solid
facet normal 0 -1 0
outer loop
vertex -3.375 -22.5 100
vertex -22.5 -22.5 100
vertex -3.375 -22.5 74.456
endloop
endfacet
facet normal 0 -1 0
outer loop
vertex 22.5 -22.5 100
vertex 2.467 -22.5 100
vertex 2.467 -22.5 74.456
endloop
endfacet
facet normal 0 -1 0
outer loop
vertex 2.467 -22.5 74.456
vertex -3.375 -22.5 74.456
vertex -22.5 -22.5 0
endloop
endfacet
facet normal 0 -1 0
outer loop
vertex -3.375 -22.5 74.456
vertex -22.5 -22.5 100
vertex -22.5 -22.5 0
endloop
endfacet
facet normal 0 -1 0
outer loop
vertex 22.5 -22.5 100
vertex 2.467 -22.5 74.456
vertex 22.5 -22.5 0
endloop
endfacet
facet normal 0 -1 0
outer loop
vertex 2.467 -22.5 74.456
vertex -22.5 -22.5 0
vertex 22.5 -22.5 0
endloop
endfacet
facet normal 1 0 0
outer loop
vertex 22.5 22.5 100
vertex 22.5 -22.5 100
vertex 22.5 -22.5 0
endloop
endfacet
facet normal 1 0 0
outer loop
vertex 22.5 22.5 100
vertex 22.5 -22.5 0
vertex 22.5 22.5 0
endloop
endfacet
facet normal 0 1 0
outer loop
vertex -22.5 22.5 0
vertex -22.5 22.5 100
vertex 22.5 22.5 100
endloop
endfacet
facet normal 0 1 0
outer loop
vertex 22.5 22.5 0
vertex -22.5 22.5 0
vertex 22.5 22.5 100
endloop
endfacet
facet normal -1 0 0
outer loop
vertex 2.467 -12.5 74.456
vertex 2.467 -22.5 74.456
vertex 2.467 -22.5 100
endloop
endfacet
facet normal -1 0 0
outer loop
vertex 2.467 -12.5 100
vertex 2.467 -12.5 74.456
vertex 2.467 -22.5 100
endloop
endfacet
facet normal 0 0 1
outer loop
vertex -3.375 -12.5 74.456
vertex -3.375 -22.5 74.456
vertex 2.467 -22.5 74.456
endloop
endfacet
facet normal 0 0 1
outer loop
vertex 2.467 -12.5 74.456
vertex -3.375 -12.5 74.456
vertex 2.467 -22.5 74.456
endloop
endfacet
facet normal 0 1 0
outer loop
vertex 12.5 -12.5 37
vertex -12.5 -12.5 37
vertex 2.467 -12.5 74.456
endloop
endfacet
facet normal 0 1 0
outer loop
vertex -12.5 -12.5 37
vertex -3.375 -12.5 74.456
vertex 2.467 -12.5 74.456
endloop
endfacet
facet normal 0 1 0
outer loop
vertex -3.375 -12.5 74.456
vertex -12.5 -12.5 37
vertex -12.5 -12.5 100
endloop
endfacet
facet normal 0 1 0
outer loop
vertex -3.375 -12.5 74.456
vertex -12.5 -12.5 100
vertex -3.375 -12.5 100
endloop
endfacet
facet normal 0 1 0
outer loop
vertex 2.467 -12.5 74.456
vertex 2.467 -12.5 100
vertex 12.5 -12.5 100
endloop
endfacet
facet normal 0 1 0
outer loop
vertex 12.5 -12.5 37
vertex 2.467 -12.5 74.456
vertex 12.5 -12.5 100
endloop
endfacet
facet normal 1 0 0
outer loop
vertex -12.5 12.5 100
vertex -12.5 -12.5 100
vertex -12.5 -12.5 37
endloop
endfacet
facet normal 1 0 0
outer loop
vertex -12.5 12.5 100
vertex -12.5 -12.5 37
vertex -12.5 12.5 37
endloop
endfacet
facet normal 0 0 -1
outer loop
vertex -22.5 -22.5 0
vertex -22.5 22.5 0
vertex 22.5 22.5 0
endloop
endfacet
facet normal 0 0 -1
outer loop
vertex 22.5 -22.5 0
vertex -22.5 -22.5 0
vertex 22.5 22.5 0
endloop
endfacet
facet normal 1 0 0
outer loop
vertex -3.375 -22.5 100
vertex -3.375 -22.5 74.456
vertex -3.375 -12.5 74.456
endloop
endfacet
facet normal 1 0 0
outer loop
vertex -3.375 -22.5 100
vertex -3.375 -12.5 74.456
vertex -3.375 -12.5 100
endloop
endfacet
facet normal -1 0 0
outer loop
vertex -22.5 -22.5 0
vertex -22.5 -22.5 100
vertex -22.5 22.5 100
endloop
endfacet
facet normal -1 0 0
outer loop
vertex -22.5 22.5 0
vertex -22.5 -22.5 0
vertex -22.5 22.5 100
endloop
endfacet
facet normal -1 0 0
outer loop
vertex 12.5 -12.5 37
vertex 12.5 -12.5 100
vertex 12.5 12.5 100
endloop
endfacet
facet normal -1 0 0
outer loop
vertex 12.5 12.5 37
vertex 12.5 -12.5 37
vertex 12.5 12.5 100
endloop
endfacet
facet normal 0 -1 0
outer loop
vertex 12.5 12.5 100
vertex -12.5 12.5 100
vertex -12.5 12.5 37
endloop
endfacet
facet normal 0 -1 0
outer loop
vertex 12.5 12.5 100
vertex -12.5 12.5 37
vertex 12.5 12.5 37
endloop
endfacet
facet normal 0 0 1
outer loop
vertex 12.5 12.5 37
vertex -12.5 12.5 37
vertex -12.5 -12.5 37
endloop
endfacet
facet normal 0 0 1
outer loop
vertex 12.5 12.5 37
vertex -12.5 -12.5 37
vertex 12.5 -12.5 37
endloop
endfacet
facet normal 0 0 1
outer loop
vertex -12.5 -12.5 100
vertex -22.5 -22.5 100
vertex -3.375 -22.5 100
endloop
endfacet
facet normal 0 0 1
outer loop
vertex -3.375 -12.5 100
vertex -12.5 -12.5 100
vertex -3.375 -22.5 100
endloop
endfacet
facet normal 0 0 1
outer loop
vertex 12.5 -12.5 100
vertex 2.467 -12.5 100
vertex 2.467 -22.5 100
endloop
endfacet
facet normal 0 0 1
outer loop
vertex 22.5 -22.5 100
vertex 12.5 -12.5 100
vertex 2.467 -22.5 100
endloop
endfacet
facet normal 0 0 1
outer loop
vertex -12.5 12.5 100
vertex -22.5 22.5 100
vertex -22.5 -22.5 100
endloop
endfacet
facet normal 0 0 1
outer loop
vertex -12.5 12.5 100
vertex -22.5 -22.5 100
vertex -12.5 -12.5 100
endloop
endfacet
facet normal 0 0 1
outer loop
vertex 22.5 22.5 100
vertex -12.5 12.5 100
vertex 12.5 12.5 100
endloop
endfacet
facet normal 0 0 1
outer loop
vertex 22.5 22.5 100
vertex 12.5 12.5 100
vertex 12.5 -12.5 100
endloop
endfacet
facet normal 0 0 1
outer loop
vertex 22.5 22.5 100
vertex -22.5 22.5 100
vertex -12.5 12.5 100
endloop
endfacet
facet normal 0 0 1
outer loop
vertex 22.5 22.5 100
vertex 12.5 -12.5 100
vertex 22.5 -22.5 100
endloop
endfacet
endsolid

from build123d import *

# Parameters (mm, degrees)
F0_W     = 45
F0_H     = 45
F1_DEPTH = 100
F2_W     = 25
F2_H     = 25
F3_DEPTH = 63
F4_W     = 5.842124
F4_H     = 25.543576
F5_DEPTH = 10


with BuildPart() as f1:
    # F0 (on Top) → F1 (new body)
    with BuildSketch(Plane.XY):
        Rectangle(F0_W, F0_H)
    extrude(amount=F1_DEPTH)

    # F2 (on face) → F3 (cut)
    with BuildSketch(Plane.XY.offset(100)):
        Rectangle(F2_W, F2_H)
    extrude(amount=-F3_DEPTH, mode=Mode.SUBTRACT)

    # F4 (on face) → F5 (cut)
    with BuildSketch(Plane.XZ.offset(22.5)):
        with Locations((-0.454231, 87.228212)):
            Rectangle(F4_W, F4_H)
    extrude(amount=-F5_DEPTH, mode=Mode.SUBTRACT)


solid = f1.part
